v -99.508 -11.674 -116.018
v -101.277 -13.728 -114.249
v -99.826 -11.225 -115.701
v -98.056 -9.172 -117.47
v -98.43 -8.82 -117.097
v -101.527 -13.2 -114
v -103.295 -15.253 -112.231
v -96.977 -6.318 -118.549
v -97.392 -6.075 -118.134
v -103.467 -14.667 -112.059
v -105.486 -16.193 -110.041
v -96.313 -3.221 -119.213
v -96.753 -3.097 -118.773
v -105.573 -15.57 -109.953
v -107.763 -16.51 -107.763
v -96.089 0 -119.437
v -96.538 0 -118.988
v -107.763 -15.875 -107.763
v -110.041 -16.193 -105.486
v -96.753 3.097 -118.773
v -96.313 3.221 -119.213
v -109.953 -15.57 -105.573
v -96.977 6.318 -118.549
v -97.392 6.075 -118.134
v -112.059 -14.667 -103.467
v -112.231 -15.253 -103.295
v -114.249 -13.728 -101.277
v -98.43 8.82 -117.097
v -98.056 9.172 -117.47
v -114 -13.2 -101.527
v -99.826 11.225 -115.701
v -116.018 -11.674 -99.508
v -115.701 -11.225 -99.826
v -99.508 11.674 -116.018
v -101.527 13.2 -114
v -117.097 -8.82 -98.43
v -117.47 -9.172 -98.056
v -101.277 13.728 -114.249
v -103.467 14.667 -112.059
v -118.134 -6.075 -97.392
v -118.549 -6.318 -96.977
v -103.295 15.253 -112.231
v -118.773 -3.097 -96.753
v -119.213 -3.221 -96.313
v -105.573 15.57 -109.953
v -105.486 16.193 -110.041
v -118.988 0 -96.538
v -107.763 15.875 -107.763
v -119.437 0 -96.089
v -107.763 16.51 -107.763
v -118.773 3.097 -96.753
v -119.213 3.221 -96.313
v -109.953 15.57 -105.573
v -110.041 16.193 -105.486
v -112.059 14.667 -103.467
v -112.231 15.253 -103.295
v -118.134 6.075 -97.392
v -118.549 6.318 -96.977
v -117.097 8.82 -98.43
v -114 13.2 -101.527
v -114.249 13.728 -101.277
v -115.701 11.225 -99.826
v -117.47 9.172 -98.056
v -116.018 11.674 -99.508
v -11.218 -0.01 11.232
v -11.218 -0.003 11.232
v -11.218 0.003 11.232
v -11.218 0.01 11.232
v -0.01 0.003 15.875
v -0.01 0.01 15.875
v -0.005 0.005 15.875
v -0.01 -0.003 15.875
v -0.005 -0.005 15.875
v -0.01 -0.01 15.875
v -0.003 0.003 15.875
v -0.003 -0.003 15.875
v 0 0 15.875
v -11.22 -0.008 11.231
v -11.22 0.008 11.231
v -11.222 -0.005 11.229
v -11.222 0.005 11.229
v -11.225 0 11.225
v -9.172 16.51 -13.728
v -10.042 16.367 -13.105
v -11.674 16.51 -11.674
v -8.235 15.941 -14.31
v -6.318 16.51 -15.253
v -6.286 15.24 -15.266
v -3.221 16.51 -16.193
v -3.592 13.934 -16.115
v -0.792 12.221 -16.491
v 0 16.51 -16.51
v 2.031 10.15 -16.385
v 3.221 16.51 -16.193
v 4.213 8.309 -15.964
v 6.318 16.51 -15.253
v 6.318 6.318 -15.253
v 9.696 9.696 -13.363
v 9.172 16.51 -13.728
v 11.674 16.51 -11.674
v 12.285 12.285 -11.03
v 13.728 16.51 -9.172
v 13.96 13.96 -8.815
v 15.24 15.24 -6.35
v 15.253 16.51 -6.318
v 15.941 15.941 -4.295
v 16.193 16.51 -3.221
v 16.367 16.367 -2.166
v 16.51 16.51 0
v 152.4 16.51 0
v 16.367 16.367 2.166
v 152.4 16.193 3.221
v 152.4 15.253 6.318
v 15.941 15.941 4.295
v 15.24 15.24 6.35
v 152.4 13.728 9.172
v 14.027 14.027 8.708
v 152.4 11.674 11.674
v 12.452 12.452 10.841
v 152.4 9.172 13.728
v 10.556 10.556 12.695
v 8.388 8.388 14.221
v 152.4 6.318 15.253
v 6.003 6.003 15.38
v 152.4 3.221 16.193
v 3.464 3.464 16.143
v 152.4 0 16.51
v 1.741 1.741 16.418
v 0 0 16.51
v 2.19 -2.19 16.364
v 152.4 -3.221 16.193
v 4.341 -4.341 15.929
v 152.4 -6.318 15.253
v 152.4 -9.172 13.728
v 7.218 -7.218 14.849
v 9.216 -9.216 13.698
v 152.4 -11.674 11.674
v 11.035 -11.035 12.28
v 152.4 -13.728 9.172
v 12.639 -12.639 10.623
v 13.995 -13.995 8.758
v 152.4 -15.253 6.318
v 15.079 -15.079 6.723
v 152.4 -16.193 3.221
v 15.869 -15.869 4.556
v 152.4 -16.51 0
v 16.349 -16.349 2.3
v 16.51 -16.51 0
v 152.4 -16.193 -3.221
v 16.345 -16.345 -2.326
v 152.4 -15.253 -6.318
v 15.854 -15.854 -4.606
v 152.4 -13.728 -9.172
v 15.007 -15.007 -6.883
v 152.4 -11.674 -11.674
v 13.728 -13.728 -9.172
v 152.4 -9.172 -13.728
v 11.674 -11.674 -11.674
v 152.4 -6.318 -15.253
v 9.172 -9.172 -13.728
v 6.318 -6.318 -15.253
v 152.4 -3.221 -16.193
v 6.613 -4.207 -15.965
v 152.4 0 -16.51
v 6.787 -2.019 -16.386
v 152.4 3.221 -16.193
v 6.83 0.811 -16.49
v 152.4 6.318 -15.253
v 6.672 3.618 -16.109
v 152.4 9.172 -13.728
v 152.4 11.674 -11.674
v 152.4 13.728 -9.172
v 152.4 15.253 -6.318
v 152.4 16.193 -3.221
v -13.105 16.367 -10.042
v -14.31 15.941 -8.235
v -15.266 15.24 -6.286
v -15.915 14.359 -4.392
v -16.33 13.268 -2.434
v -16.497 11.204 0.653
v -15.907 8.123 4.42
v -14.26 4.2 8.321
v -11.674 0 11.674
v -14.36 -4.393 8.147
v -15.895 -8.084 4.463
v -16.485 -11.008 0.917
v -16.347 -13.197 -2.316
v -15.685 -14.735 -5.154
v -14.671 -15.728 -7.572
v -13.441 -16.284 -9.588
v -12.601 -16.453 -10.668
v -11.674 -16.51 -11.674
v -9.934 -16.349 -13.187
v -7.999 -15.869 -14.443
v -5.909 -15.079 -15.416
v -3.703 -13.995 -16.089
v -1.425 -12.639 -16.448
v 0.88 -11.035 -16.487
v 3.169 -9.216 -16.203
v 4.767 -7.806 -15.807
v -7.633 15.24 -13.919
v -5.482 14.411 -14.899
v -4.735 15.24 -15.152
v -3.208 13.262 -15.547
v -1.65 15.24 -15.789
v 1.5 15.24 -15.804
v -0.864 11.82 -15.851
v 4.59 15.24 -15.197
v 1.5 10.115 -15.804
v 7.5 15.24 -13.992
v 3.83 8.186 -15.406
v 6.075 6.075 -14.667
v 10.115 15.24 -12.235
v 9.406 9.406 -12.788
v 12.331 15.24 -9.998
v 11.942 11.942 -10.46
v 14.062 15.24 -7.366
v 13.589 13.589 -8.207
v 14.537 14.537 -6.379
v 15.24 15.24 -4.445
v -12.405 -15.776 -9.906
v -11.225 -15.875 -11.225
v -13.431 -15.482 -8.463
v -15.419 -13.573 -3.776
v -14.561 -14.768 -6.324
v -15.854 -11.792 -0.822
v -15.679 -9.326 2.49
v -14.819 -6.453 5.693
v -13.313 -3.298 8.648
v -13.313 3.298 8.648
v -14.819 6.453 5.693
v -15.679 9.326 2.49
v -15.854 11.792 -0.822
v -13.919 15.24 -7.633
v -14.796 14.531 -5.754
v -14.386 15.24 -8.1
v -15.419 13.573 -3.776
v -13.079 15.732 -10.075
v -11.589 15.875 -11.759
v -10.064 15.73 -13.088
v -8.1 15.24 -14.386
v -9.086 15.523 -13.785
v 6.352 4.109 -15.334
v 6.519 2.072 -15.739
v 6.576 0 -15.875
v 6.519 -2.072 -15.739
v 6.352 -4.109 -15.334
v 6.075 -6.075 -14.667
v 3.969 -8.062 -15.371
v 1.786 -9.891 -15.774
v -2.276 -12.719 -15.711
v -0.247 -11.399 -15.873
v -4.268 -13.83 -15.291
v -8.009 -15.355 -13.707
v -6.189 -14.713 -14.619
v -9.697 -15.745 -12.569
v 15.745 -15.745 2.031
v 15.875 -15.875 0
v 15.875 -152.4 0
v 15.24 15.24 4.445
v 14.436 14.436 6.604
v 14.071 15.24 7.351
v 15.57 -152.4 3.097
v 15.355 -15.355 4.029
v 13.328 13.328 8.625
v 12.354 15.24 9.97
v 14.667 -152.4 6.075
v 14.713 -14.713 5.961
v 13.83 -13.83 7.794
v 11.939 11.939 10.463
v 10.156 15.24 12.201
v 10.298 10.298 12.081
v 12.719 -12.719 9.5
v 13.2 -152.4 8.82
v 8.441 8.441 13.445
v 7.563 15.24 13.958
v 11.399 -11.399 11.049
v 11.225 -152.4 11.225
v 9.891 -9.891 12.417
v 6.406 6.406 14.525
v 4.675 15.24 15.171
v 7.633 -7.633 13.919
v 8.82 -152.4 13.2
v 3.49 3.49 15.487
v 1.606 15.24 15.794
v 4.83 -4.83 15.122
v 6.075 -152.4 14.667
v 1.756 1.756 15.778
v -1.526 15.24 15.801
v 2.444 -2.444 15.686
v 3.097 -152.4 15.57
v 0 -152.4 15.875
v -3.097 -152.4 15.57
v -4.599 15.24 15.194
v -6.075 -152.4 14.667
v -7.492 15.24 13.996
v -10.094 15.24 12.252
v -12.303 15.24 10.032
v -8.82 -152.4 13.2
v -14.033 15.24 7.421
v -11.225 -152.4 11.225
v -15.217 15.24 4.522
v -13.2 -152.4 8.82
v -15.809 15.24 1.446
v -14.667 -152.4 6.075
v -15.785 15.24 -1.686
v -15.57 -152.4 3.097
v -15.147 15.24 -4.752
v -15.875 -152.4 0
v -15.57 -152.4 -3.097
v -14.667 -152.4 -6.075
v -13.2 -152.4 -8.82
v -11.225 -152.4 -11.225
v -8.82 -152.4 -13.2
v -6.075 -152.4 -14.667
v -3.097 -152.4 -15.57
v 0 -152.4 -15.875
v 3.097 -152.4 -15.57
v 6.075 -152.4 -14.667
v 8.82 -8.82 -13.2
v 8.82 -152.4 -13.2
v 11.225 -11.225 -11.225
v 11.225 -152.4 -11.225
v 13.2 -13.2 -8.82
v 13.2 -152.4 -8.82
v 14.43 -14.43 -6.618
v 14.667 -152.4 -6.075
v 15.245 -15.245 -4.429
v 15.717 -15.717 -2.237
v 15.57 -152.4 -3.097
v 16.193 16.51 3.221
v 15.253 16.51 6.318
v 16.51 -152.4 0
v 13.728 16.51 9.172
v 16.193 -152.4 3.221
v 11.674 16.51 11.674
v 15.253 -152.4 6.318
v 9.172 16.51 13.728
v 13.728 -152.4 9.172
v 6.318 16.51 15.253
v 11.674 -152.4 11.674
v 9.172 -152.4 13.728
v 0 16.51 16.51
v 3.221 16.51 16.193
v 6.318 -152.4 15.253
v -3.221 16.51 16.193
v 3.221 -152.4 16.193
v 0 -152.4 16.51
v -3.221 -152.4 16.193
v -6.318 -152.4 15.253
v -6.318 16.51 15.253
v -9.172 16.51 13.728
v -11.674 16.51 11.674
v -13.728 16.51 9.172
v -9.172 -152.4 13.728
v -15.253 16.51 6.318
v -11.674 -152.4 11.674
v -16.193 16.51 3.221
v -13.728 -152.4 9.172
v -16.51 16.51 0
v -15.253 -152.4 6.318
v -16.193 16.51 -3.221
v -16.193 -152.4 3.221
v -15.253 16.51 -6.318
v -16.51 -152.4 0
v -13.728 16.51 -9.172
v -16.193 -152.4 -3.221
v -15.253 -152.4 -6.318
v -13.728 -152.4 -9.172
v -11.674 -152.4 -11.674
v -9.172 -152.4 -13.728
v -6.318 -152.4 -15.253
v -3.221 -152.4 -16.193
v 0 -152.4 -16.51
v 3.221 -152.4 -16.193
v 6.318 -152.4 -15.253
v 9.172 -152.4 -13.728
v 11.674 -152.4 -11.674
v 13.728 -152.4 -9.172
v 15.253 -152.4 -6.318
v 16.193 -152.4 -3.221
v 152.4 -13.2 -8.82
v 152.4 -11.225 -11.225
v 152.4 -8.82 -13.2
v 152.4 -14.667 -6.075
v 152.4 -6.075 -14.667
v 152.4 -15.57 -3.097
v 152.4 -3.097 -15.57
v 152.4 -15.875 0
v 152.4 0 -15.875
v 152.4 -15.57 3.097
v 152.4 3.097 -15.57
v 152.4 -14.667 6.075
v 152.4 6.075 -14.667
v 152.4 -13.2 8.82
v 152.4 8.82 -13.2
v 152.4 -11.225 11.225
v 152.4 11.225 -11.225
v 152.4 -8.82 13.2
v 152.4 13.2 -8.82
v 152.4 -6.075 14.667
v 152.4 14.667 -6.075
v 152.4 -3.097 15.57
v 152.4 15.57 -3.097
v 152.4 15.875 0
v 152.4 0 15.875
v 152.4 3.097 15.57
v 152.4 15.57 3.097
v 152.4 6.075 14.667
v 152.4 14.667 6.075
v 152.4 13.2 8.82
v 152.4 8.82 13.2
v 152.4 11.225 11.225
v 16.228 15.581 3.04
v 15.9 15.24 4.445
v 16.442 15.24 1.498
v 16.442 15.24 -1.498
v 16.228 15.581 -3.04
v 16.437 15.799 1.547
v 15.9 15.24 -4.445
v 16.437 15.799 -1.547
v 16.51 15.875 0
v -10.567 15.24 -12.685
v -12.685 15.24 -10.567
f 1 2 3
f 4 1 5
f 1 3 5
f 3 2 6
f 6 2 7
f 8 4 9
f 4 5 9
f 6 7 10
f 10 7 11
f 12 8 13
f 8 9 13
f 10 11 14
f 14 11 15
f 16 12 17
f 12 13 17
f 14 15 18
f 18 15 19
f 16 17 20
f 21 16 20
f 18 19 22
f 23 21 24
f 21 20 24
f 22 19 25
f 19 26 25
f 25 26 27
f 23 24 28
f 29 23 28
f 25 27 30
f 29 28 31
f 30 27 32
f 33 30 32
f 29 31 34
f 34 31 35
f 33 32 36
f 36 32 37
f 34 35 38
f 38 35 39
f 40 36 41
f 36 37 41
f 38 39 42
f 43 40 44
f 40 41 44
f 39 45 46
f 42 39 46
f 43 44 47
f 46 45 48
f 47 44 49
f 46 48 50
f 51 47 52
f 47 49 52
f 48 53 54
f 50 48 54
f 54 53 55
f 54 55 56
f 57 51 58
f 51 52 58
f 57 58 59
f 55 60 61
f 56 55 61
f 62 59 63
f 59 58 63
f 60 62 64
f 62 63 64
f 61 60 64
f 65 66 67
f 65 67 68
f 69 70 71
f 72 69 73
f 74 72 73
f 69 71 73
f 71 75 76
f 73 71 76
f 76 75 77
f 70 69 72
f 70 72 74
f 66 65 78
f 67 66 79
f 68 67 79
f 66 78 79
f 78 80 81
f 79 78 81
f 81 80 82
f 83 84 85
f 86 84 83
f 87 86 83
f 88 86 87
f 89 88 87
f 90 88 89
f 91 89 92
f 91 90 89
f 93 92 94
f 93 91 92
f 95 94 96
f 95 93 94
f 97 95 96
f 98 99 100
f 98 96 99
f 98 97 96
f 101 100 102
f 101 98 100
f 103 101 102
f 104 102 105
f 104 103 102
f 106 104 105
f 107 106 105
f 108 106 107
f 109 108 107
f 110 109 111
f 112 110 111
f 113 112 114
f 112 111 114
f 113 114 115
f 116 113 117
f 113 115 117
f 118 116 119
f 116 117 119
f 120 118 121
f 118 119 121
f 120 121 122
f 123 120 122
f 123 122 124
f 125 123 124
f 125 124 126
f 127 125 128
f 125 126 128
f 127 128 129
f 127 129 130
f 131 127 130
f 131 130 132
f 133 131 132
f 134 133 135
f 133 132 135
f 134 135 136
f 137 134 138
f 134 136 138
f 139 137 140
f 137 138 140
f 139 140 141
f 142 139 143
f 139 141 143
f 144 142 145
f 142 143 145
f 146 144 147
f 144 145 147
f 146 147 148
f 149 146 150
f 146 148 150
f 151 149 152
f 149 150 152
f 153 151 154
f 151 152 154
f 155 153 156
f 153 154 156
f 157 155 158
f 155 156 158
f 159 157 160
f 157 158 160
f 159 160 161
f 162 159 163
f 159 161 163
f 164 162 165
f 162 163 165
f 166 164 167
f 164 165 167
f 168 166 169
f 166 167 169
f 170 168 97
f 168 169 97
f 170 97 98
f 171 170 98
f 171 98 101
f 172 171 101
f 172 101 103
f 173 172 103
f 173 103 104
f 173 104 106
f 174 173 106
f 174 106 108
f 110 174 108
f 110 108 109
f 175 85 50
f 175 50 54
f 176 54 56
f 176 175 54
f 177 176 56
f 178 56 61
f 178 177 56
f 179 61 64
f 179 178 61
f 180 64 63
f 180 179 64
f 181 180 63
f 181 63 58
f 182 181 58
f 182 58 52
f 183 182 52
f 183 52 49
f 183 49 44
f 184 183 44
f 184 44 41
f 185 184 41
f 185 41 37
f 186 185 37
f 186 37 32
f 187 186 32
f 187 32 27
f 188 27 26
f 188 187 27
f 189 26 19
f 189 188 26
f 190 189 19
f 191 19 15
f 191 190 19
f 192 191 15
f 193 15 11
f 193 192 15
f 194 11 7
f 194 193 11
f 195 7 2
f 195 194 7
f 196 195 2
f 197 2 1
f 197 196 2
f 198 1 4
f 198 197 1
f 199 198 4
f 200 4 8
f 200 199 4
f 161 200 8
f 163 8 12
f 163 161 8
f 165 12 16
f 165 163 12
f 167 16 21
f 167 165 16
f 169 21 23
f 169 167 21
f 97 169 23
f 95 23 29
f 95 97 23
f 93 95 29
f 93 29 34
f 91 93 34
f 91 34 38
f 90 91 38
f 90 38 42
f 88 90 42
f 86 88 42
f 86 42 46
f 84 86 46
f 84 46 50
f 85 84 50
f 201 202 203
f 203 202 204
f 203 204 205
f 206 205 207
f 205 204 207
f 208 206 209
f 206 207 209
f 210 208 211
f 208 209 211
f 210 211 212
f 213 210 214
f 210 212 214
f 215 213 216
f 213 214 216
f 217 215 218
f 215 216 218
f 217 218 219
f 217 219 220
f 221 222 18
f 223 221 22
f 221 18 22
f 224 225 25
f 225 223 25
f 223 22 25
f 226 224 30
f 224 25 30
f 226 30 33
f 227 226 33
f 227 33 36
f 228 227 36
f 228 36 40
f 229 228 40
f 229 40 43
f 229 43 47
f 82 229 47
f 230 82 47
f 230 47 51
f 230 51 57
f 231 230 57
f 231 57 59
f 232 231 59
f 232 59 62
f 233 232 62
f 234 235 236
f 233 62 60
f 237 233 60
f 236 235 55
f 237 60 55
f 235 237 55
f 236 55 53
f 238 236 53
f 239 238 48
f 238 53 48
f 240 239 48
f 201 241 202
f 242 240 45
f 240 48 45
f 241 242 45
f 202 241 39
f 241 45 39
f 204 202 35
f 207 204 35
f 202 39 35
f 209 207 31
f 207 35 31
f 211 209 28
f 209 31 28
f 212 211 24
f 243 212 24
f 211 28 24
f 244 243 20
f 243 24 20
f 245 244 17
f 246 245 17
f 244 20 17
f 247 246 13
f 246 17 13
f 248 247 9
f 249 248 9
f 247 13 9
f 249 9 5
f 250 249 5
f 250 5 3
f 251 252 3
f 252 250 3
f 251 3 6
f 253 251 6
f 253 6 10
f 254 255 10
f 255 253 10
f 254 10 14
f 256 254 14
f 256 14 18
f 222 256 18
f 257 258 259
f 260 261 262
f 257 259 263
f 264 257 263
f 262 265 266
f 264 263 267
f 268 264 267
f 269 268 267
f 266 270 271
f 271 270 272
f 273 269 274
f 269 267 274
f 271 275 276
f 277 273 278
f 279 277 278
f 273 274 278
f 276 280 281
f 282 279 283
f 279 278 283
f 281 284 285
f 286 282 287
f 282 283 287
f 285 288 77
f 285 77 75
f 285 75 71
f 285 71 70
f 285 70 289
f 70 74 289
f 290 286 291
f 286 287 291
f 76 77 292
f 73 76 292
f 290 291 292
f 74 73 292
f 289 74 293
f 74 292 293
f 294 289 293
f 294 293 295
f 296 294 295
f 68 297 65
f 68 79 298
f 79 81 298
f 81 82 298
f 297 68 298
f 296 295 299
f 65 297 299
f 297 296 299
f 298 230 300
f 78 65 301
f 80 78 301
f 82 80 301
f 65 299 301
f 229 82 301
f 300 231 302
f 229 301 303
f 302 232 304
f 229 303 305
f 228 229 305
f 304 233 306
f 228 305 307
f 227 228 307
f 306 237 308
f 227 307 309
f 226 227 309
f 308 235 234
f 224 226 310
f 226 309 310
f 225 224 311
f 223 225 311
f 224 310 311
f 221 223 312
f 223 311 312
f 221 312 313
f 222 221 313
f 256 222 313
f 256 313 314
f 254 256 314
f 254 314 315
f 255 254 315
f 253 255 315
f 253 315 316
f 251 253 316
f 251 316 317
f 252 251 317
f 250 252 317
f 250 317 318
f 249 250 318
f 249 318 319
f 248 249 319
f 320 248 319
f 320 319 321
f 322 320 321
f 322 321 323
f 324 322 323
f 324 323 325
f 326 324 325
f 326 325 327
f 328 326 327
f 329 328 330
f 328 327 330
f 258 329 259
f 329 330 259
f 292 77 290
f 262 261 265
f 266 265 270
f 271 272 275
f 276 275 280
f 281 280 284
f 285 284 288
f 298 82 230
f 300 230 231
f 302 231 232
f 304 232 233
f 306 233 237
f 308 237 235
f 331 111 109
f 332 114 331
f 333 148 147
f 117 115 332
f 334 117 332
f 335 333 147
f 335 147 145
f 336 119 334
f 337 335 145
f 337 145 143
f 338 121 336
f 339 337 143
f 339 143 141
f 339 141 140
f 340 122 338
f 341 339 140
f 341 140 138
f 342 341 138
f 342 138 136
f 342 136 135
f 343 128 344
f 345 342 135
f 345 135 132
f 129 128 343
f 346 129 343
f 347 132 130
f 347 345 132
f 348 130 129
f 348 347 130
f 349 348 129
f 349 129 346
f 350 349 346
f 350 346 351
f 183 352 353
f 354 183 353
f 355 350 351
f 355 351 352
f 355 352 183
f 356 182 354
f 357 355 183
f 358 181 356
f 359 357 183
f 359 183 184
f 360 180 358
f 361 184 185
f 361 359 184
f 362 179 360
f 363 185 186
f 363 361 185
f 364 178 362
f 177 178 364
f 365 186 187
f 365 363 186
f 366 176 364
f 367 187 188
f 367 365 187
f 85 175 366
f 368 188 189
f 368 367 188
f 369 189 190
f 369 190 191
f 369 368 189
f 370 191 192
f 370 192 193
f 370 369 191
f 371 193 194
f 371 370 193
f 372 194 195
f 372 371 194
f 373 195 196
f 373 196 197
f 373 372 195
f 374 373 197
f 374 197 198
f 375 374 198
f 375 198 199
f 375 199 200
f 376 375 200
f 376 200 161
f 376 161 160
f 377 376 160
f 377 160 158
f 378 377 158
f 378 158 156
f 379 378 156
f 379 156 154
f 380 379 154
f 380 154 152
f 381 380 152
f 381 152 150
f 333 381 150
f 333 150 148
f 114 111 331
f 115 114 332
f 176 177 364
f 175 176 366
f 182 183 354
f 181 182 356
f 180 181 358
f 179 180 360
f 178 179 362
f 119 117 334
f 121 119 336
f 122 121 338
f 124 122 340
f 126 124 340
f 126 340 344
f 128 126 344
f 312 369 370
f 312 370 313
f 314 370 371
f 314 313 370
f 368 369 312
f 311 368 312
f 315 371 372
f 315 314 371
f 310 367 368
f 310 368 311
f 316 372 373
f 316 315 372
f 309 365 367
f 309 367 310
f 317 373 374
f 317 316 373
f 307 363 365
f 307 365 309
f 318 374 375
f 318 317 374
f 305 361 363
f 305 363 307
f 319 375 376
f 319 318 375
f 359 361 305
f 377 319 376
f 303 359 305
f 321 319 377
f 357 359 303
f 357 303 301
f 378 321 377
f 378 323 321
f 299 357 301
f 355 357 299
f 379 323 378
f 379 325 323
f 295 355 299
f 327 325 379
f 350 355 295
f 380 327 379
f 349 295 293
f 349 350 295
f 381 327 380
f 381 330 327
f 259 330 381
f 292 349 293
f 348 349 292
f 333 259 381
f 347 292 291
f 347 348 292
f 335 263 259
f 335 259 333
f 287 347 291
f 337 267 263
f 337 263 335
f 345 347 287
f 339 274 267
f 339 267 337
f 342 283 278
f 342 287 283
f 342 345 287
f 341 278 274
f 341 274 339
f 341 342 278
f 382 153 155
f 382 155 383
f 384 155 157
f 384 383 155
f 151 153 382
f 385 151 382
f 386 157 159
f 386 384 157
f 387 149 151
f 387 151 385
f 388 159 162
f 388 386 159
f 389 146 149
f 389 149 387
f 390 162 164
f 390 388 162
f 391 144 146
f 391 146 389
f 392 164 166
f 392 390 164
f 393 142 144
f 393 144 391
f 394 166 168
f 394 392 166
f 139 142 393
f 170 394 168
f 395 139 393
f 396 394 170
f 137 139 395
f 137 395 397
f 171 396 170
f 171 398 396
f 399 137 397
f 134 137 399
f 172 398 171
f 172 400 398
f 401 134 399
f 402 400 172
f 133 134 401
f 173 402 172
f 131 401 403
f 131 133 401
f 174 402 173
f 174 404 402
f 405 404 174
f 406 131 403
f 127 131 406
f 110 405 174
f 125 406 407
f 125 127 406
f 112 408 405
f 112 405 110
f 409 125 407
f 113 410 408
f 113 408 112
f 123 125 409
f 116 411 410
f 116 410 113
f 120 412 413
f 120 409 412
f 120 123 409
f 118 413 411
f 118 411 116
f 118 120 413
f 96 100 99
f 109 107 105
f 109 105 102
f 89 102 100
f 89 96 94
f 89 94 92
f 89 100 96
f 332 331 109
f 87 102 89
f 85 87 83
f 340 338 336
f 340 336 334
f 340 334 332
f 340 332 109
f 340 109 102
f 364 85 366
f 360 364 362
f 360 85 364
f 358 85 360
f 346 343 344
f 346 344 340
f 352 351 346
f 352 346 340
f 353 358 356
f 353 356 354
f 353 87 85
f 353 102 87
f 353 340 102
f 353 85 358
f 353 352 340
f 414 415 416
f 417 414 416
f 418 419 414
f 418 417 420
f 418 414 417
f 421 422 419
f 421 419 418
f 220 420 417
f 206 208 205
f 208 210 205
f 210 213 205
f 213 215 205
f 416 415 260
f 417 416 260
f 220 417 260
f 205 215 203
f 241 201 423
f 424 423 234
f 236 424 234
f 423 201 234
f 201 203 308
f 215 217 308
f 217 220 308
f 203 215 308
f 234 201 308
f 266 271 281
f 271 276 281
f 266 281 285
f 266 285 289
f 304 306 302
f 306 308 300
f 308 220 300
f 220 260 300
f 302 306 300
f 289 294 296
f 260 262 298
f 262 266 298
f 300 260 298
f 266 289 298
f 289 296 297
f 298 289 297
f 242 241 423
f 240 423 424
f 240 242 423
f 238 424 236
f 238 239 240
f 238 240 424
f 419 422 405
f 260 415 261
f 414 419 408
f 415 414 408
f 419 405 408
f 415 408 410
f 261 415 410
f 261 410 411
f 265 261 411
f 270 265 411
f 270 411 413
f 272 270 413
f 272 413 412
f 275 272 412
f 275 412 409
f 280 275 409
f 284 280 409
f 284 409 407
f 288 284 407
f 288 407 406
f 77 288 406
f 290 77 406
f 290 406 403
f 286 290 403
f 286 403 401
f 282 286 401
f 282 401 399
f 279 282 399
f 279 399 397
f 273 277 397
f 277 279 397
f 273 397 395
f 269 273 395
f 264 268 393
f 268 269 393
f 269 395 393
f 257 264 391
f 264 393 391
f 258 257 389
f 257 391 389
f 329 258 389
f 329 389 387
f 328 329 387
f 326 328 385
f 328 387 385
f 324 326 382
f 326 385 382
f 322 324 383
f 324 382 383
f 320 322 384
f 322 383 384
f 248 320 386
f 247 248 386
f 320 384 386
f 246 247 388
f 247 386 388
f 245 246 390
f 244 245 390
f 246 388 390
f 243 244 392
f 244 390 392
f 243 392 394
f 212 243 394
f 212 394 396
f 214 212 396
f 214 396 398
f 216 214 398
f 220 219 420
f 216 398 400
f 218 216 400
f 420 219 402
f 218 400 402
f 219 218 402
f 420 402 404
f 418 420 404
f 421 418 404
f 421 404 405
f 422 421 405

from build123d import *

# Parameters (mm, degrees)
F0_R          = 16.51
F1_DEPTH      = 152.4
F1_DEPTH_BACK = 152.4
F2_R          = 16.51
F3_DEPTH      = 152.4
F5_R          = 16.51
F6_DEPTH      = 152.4
F7_R          = 15.875
F8_DEPTH      = 304.801
F9_R          = 15.875
F10_DEPTH     = 152.41
F11_R         = 15.875
F12_DEPTH     = 152.41
F13_R         = 16.51
F14_DEPTH     = 135.89
F15_R         = 16.51
F16_DEPTH     = 1.27


with BuildPart() as f1:
    # F0 (on Front) → F1 (new body, two sides)
    with BuildSketch(Plane.XZ) as f1_sk:
        Circle(F0_R)
    extrude(amount=F1_DEPTH)
    extrude(f1_sk.sketch, amount=-F1_DEPTH_BACK)

    # F2 (on Right) → F3 (join)
    with BuildSketch(Plane.YZ):
        Circle(F2_R)
    extrude(amount=F3_DEPTH)

    # F5 (on face) → F6 (join)
    with BuildSketch(Plane(origin=(0, 0, 0), x_dir=(0, 1, 0), z_dir=(0.7071067812, 0, 0.7071067812))):
        Circle(F5_R)
    extrude(amount=-F6_DEPTH)

    # F7 (on face) → F8 (cut, through all)
    with BuildSketch(Plane.XZ.offset(152.4)):
        Circle(F7_R)
    extrude(amount=-F8_DEPTH, mode=Mode.SUBTRACT)

    # F9 (on face) → F10 (cut, up to face)
    with BuildSketch(Plane.YZ.offset(152.4)):
        Circle(F9_R)
    extrude(amount=-F10_DEPTH, mode=Mode.SUBTRACT)

    # F11 (on face) → F12 (cut, up to face)
    with BuildSketch(Plane(origin=(-107.7630734528, 0, -107.7630734528), x_dir=(0, -1, 0), z_dir=(-0.7071067812, 0, -0.7071067812))):
        Circle(F11_R)
    extrude(amount=-F12_DEPTH, mode=Mode.SUBTRACT)

    # F13 (on face) → F14 (cut)
    with BuildSketch(Plane(origin=(0, 152.4, 0), x_dir=(-1, 0, 0), z_dir=(0, 1, 0))):
        Circle(F13_R)
    extrude(amount=-F14_DEPTH, mode=Mode.SUBTRACT)

    # F15 (on face) → F16 (join)
    with BuildSketch(Plane(origin=(0, 16.51, 0), x_dir=(-1, 0, 0), z_dir=(0, 1, 0))):
        Circle(F15_R)
    extrude(amount=-F16_DEPTH)


solid = f1.part
